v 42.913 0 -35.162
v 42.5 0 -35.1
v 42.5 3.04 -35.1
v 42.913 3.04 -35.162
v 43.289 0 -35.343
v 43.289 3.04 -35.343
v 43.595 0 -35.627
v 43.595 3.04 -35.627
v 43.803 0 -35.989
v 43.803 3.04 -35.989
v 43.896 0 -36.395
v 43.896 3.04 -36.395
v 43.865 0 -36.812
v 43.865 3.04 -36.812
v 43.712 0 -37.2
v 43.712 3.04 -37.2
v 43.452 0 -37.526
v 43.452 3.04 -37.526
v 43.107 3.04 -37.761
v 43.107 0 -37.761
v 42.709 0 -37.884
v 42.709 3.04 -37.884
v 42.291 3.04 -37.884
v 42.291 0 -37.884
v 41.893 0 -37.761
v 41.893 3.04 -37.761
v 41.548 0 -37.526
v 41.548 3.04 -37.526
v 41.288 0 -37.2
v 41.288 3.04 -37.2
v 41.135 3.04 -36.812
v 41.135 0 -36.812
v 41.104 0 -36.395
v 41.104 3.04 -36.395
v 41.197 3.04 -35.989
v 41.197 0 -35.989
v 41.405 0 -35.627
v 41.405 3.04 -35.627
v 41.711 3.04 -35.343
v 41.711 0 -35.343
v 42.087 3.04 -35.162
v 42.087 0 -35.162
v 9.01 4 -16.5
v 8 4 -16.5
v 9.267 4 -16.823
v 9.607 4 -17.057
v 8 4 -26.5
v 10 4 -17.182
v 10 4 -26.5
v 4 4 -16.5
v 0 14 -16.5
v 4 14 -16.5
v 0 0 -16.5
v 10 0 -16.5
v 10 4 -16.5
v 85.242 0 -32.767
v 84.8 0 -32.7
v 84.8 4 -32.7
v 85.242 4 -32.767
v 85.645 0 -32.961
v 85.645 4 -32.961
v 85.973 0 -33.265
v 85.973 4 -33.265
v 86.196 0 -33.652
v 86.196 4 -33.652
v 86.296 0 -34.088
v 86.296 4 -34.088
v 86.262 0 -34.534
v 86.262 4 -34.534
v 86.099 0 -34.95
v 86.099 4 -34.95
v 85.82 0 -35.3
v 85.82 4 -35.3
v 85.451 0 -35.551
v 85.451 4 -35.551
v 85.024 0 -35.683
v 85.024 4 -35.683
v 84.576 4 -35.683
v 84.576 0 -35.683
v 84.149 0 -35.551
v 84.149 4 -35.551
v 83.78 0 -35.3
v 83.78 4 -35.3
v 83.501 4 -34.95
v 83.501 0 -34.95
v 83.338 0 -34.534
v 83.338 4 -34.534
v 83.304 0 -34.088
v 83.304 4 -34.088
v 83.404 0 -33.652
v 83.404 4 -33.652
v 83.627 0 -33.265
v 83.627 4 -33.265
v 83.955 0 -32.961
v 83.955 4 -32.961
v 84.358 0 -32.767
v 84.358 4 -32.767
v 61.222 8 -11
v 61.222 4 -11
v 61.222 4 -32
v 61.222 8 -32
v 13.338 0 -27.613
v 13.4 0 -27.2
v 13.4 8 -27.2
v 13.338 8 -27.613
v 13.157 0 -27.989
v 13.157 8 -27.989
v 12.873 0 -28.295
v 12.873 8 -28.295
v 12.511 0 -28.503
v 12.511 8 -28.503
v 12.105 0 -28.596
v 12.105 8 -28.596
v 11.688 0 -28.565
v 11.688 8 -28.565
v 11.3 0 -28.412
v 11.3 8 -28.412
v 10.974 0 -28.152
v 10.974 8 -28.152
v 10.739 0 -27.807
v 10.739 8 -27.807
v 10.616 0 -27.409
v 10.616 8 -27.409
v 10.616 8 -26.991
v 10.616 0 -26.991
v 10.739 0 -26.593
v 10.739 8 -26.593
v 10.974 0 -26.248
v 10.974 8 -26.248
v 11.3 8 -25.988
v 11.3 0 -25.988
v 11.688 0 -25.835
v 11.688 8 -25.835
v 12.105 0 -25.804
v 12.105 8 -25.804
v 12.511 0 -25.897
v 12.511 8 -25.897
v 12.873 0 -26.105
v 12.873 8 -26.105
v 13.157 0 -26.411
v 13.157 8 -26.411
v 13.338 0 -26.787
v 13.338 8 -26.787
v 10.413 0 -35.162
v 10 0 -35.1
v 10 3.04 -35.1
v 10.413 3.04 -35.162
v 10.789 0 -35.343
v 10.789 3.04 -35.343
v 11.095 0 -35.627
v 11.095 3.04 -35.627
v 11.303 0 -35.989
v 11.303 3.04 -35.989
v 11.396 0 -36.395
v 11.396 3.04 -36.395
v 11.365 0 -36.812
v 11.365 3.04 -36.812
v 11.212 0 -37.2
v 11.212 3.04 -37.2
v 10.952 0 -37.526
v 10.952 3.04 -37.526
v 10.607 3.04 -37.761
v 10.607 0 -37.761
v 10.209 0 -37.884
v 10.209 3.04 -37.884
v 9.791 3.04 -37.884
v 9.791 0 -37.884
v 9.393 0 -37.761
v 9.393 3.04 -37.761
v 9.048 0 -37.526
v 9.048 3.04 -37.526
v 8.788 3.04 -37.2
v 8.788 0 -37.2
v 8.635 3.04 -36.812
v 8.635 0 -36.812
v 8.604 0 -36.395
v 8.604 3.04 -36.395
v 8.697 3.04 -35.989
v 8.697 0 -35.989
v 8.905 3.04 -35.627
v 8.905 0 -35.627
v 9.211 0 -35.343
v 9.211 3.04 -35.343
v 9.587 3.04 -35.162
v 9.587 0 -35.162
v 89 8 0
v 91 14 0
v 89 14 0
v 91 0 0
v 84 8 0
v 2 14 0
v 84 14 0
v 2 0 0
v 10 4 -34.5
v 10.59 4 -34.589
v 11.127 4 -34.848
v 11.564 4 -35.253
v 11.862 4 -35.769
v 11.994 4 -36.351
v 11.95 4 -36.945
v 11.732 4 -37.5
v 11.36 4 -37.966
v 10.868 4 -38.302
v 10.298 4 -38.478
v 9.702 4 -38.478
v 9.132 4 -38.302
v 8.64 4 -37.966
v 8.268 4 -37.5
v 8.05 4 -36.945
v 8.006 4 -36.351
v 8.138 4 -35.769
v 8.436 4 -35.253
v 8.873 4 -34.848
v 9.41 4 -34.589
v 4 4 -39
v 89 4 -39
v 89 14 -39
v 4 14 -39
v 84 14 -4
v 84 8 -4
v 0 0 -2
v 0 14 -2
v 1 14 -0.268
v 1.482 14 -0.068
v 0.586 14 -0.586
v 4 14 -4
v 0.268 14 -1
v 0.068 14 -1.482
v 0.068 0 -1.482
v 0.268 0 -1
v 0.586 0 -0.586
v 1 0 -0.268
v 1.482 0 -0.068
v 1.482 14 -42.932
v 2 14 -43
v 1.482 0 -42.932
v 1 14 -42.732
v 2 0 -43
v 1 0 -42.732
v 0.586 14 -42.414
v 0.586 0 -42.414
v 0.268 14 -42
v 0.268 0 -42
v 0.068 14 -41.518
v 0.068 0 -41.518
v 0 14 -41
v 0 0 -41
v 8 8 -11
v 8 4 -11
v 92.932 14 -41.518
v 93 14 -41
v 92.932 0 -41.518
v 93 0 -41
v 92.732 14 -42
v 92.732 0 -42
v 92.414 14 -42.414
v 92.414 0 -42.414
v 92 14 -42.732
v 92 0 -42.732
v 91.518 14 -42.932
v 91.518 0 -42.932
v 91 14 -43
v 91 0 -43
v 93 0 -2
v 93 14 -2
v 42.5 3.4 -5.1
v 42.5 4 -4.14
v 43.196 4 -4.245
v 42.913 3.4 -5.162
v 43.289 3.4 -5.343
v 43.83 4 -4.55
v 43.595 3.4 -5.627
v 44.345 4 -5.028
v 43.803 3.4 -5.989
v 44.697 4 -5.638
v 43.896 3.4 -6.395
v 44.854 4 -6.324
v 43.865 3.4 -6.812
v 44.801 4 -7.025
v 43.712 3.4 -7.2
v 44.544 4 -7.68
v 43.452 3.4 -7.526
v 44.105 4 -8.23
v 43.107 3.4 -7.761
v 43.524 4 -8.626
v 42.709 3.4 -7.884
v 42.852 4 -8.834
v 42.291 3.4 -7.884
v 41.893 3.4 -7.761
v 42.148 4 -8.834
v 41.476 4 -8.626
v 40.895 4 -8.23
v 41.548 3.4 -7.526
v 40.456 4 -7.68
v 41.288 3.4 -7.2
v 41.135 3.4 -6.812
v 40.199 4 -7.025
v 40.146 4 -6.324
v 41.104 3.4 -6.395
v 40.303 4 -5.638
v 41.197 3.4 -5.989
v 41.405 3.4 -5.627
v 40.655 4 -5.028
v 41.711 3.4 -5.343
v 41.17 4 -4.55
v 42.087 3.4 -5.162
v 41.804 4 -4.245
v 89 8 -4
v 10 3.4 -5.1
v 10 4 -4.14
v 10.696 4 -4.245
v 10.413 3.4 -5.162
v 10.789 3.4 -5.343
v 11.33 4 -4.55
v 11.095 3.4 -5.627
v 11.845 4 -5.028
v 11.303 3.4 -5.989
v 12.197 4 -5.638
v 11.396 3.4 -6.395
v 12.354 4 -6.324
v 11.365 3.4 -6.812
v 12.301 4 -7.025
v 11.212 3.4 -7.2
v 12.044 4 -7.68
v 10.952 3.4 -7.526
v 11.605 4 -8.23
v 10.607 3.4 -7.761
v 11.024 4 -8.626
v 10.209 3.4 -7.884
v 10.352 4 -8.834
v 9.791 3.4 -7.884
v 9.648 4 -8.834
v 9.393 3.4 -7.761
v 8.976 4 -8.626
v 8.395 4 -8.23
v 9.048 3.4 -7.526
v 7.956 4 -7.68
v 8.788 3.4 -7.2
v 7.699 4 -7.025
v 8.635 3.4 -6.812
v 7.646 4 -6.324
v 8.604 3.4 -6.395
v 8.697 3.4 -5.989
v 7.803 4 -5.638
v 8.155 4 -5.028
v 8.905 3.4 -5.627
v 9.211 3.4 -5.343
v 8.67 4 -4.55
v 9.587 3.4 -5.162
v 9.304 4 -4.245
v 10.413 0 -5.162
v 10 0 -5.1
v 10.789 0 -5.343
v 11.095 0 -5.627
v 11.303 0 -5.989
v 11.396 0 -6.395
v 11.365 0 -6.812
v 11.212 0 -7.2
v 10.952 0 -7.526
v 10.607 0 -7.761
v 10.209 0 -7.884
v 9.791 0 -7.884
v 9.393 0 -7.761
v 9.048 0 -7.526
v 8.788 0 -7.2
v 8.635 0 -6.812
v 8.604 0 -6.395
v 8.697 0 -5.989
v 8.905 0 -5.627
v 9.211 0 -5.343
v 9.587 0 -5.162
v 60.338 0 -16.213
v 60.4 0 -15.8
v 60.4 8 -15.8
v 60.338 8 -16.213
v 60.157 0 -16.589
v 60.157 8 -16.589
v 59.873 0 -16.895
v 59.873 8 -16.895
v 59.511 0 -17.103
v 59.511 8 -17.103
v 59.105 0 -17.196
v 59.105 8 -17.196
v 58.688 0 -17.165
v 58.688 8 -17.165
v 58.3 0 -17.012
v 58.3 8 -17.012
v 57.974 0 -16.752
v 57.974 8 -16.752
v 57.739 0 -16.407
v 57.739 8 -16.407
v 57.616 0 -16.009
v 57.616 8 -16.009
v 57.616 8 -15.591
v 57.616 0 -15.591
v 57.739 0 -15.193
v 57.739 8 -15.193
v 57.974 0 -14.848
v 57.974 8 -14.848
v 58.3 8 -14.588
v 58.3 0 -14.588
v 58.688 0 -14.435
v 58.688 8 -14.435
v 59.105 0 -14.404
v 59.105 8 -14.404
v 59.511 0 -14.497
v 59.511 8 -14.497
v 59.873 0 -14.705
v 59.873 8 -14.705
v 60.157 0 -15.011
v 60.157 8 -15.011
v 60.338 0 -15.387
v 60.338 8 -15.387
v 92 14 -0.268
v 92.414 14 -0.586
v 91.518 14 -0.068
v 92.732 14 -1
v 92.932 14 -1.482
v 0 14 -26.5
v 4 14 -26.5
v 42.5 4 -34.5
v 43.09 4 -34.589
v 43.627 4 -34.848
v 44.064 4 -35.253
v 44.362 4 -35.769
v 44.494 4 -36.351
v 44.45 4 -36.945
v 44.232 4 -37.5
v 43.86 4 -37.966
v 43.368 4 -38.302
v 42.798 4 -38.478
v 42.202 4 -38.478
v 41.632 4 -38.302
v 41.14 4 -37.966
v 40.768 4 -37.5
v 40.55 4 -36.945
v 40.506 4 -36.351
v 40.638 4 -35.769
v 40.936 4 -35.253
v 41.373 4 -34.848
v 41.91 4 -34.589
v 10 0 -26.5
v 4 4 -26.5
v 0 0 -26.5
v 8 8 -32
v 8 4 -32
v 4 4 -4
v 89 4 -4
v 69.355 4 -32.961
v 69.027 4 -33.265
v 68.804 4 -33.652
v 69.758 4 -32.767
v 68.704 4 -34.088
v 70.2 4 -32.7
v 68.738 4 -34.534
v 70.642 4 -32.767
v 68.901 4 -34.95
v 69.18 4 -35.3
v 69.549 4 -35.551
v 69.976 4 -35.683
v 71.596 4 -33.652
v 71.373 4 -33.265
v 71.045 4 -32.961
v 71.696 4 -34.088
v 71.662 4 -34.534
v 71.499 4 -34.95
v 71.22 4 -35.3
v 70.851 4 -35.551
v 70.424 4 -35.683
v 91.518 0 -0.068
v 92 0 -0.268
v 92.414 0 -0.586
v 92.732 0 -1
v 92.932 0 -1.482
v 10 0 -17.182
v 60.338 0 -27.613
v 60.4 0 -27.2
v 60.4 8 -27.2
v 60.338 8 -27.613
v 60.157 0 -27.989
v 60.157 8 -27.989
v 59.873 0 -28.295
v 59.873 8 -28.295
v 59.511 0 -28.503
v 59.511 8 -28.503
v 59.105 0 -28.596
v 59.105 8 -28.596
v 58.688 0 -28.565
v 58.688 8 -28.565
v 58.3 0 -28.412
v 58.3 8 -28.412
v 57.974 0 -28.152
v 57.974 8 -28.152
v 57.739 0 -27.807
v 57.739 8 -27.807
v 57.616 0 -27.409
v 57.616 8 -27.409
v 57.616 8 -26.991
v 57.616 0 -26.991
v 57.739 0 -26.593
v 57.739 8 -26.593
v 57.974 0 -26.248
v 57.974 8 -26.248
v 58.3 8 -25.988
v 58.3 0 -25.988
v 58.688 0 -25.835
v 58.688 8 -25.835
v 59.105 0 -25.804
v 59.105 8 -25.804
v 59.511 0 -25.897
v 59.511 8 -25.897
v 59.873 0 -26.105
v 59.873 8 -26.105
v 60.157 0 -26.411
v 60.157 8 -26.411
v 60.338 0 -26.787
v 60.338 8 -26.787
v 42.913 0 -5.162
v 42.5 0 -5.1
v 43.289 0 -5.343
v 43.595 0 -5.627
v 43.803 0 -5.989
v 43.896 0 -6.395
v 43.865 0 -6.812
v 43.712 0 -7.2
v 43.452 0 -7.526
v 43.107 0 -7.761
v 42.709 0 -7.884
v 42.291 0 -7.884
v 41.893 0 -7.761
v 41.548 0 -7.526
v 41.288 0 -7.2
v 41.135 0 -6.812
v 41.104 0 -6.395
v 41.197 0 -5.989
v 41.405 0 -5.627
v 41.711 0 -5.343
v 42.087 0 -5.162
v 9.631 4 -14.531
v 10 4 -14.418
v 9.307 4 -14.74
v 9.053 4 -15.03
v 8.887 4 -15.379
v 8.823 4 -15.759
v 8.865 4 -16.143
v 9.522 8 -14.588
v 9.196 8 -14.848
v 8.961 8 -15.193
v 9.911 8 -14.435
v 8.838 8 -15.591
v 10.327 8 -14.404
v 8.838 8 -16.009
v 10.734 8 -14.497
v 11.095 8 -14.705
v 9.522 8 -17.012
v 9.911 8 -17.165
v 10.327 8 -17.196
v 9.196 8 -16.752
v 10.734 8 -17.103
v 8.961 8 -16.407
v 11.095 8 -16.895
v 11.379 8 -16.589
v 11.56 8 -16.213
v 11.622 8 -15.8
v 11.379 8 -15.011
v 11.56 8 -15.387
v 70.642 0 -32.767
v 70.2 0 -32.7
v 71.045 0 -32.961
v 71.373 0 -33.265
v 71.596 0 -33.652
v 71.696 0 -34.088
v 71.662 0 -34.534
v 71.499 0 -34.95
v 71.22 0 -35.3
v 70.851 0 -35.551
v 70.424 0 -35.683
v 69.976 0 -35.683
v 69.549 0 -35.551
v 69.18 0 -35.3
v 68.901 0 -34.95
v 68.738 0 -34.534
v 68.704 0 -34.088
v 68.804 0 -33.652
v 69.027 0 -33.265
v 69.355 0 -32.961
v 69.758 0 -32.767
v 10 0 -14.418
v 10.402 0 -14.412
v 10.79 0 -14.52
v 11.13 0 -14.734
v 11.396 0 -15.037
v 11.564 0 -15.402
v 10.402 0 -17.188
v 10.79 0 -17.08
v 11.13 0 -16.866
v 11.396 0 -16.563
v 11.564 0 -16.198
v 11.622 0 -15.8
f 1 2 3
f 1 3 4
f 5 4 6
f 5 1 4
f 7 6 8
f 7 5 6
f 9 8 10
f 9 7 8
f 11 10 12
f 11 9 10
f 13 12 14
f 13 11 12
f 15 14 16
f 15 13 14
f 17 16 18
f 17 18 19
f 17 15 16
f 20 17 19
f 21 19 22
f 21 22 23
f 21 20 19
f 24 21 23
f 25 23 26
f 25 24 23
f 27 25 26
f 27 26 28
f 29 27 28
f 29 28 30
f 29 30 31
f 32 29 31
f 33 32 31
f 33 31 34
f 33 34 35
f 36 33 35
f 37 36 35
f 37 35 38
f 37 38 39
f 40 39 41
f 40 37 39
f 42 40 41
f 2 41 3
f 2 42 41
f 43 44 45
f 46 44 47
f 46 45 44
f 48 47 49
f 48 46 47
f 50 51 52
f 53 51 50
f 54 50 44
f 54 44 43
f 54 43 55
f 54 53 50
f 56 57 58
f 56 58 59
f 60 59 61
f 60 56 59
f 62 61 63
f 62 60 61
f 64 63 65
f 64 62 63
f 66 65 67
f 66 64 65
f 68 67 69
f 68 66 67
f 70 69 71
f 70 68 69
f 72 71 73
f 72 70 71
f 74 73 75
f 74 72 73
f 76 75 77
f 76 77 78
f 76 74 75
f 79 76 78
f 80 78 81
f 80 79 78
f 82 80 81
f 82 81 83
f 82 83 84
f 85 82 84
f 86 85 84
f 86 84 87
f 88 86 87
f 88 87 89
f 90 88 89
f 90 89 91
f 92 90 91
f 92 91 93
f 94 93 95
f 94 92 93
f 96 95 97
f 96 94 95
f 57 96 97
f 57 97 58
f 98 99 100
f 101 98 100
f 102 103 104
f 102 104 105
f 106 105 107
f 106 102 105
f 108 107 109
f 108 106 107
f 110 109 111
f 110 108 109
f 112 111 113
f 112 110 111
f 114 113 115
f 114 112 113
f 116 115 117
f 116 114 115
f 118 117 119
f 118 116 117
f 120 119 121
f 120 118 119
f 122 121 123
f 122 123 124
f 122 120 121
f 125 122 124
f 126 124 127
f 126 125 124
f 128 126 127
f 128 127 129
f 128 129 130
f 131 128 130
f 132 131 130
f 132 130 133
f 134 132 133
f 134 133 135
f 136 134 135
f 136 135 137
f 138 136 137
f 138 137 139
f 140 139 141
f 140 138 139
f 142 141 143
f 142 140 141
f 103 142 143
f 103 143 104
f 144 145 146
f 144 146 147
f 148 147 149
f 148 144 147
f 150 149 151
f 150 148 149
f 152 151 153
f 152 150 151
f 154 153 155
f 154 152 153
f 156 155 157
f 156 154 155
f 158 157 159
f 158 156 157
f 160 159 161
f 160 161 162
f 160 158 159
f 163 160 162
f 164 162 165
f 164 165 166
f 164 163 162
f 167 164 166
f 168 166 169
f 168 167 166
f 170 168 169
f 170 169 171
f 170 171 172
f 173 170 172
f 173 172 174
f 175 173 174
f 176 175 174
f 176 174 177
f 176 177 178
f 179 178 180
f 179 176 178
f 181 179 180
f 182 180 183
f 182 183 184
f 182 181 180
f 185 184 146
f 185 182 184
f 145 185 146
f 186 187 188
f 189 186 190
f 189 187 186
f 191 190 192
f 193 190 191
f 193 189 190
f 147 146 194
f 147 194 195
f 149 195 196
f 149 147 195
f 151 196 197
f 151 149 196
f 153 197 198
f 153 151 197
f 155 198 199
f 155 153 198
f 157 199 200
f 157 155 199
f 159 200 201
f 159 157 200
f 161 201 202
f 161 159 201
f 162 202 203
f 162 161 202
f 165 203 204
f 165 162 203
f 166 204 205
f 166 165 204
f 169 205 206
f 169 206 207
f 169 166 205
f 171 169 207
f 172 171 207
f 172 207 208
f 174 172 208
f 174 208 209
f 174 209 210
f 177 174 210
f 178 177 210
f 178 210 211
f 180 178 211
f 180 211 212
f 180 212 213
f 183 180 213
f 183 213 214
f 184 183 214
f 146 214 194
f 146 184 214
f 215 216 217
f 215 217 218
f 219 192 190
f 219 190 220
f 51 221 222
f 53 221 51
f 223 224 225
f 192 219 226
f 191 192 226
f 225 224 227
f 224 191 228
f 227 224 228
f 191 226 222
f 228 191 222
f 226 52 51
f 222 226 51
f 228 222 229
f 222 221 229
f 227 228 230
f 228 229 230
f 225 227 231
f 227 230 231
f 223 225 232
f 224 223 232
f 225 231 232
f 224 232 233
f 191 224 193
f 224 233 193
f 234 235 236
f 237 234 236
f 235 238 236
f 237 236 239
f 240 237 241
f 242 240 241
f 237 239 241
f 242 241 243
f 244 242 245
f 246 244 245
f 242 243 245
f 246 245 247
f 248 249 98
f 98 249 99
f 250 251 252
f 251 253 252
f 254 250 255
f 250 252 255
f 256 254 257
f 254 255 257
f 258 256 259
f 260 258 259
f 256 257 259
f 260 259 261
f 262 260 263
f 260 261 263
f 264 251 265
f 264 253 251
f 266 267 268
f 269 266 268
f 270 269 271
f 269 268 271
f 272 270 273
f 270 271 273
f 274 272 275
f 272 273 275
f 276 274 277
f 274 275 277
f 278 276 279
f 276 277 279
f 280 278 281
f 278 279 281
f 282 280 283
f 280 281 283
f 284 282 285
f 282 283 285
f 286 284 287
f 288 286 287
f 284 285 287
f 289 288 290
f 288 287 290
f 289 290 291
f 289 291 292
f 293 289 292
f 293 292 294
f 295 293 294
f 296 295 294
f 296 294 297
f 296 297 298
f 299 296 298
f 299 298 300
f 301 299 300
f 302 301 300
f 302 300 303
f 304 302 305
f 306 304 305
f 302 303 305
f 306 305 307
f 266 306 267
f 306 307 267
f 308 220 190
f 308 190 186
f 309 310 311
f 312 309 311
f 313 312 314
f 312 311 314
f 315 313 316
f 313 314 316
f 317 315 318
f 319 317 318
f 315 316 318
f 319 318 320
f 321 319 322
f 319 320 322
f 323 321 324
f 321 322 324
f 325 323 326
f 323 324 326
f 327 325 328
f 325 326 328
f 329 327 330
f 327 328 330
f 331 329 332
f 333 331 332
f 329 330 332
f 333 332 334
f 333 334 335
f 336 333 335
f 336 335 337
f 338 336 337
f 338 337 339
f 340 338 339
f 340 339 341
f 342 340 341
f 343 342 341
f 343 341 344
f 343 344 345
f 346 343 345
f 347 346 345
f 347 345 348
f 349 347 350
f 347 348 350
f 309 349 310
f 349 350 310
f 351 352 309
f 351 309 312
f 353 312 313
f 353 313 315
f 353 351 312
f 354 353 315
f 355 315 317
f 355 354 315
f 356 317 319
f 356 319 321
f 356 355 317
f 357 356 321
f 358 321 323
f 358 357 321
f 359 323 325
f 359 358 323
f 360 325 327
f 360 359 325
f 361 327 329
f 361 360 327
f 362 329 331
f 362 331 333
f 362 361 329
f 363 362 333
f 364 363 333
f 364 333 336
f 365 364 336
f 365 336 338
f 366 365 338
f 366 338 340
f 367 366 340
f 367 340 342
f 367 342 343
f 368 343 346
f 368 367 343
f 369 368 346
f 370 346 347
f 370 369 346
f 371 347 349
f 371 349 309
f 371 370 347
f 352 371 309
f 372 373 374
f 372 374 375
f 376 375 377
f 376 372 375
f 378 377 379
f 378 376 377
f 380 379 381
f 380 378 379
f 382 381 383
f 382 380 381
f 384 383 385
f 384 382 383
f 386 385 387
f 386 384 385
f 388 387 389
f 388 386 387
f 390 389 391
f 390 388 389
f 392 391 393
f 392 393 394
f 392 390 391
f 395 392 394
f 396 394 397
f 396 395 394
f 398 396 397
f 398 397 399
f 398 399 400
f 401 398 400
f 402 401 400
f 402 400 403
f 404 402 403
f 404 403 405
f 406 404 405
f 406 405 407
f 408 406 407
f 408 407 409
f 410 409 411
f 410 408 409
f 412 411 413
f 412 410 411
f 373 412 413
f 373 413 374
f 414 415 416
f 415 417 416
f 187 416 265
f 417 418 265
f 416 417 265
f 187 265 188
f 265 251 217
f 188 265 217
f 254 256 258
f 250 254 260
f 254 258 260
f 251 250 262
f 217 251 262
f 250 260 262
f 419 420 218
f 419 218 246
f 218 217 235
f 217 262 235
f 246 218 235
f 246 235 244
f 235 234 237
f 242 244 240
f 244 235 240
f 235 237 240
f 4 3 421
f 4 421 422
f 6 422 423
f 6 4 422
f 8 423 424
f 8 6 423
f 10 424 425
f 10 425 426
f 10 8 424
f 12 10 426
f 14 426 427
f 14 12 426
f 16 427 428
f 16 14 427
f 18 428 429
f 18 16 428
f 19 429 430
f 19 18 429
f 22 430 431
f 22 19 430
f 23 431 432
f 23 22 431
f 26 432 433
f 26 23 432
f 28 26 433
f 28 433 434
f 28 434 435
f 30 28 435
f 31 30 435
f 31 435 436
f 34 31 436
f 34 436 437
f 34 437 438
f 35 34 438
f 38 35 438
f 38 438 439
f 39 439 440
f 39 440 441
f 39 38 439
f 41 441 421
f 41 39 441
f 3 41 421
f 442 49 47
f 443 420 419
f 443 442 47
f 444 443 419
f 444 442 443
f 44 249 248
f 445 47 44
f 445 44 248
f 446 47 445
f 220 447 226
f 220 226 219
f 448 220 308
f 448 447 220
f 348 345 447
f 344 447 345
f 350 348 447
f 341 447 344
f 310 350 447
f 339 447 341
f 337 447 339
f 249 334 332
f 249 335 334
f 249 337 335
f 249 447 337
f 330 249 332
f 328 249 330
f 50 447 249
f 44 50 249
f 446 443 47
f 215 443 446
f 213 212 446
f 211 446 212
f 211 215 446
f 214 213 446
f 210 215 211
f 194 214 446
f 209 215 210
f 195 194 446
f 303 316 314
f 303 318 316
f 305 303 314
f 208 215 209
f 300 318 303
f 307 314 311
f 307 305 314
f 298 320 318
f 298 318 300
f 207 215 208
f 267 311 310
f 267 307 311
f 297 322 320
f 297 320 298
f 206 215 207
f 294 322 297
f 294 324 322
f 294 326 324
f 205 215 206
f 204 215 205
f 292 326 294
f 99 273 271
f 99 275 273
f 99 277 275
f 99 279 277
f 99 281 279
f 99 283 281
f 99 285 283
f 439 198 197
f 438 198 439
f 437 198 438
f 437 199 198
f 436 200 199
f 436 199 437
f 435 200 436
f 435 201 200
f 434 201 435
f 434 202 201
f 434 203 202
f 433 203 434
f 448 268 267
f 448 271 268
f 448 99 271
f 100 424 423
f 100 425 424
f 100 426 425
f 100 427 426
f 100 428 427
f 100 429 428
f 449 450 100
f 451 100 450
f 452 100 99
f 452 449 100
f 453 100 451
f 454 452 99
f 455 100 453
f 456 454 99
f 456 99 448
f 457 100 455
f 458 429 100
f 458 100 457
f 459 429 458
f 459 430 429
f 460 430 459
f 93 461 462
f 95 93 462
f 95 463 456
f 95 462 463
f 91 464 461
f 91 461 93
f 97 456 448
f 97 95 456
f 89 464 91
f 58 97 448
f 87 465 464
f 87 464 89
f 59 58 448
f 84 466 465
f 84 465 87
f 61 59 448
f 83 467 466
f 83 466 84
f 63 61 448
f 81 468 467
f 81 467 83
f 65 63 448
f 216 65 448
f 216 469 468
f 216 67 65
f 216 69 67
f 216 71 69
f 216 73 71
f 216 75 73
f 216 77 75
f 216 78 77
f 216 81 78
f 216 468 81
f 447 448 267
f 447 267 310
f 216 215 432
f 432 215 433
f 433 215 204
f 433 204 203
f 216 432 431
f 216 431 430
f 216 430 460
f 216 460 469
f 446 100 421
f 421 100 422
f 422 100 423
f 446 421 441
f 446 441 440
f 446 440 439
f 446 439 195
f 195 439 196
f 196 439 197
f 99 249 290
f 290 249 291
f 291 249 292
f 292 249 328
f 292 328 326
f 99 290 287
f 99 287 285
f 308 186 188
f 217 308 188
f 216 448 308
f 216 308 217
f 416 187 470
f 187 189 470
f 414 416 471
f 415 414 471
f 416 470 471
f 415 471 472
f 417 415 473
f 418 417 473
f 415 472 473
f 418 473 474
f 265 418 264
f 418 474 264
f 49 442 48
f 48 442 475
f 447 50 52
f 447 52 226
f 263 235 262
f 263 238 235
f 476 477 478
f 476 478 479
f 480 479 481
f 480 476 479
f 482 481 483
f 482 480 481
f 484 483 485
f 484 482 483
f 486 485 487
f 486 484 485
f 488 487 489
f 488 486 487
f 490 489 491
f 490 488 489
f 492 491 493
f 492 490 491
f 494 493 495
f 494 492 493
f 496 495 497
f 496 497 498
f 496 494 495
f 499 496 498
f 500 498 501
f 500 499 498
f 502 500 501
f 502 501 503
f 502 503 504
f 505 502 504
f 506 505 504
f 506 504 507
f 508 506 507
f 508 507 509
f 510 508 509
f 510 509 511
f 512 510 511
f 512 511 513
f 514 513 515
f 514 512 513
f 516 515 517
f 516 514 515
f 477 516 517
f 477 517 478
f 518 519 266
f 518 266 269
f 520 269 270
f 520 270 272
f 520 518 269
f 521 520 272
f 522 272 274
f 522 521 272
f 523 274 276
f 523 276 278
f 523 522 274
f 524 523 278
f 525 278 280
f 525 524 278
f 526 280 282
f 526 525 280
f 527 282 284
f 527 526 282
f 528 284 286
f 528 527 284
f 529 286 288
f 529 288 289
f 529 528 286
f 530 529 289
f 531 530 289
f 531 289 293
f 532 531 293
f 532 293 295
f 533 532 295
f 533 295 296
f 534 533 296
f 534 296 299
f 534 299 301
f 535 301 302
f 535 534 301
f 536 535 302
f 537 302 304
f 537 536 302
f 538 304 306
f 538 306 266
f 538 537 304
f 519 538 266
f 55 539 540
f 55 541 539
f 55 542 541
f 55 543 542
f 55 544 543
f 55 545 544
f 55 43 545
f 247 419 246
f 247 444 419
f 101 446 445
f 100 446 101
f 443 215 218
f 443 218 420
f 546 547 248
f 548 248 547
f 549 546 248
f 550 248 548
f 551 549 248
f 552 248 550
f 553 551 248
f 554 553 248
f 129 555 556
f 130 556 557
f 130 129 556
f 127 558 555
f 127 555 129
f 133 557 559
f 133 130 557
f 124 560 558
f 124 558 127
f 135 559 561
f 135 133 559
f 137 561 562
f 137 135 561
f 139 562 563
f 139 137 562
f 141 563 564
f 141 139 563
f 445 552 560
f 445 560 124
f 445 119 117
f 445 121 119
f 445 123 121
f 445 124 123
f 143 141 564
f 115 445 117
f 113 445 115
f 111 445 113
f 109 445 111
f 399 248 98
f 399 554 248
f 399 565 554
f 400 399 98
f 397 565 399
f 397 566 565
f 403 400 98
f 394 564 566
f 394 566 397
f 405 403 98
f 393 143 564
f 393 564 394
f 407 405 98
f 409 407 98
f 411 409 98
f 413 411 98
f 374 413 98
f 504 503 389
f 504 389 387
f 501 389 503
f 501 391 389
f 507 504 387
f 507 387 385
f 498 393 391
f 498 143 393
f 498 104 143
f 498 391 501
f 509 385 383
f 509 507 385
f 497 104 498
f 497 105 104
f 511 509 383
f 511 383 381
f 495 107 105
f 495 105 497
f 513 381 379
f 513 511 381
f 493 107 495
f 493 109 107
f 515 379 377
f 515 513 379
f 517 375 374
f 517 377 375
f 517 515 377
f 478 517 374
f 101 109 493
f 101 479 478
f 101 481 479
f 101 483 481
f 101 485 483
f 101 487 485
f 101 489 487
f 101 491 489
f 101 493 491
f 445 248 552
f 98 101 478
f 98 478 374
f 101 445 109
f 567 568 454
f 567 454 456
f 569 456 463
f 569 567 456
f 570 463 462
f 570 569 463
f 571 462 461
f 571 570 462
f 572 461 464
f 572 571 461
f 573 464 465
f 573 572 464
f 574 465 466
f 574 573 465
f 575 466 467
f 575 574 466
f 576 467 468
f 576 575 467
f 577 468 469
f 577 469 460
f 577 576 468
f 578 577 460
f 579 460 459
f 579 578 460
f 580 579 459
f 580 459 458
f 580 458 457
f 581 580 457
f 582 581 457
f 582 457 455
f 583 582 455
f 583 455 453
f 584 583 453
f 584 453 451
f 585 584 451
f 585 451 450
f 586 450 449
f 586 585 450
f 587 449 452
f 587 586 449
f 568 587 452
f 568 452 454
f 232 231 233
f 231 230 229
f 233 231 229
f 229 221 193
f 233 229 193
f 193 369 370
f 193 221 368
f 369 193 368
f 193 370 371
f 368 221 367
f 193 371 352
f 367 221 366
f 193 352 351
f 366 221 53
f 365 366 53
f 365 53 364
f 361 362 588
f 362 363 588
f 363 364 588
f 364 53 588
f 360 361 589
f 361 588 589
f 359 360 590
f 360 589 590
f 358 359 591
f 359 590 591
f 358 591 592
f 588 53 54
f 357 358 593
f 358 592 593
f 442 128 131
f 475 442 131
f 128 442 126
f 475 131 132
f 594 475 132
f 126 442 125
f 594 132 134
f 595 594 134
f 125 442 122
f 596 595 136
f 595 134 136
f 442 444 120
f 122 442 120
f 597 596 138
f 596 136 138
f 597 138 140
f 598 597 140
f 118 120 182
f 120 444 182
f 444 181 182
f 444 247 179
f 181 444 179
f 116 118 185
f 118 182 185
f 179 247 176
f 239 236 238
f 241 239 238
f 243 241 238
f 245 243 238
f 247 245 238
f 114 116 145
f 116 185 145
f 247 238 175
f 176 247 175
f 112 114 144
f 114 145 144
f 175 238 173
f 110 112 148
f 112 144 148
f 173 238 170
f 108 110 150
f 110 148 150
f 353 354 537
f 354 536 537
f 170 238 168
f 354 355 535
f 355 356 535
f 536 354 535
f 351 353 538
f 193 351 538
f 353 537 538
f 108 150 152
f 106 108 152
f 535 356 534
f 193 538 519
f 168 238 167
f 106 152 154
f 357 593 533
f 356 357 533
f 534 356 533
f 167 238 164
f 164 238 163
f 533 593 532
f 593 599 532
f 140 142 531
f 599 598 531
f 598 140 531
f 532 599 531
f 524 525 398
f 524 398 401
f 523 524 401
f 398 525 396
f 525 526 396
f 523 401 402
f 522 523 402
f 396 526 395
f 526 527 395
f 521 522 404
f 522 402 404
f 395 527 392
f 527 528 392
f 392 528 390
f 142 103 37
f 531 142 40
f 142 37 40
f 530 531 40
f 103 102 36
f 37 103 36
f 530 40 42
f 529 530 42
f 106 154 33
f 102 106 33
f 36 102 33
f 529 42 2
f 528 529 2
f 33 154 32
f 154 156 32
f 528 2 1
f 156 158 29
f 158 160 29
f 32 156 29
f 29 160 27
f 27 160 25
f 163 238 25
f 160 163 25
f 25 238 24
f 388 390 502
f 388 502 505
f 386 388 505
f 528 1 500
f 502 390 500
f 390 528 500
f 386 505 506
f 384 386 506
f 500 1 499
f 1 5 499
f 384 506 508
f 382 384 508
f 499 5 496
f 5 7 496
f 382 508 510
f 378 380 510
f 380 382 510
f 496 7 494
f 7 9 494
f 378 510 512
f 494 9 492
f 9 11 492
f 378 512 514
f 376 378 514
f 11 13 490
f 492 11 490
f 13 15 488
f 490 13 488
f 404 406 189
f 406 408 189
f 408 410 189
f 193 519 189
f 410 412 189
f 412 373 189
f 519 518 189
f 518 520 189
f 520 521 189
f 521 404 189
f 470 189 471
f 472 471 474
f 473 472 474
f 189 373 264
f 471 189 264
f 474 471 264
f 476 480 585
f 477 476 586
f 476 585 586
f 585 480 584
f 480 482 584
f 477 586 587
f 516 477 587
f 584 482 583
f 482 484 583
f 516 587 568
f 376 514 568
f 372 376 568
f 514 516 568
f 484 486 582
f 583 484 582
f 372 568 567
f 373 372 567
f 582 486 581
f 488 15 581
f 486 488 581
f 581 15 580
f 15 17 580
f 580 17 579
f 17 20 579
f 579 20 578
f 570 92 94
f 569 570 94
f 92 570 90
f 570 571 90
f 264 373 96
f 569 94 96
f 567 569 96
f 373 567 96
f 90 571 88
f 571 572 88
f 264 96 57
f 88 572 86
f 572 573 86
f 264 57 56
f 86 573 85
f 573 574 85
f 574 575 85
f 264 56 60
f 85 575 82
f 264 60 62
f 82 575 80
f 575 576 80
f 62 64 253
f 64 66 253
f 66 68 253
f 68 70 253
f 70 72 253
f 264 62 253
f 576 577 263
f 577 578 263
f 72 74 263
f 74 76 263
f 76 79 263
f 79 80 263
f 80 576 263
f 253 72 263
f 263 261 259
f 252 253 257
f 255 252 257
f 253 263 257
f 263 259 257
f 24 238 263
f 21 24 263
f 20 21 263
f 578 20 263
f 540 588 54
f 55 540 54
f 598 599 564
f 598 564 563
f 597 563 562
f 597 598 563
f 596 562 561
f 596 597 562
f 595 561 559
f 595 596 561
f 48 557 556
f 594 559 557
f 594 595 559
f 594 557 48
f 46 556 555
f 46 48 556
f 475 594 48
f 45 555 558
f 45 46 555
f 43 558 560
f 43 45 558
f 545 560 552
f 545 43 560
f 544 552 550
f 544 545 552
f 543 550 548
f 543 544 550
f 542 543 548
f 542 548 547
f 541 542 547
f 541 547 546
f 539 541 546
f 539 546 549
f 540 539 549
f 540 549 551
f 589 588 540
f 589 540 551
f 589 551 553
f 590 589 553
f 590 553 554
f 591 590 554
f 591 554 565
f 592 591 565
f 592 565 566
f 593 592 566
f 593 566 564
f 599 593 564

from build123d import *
from OCP.BRepFilletAPI import BRepFilletAPI_MakeChamfer

# Parameters (mm, degrees)
SKETCH1_W               = 93
SKETCH1_H               = 43
SKETCH1_R               = 1.4
SKETCH1_W_2             = 51
SKETCH1_H_2             = 21
SKETCH1_W_3             = 21
SKETCH1_H_3             = 34
BOSS_EXTRUDE1_DEPTH     = 4
BOSS_EXTRUDE2_OUTLINE_W = 53.222222222
BOSS_EXTRUDE2_OUTLINE_H = 21
BOSS_EXTRUDE2_OUTLINE_R = 1.4
BOSS_EXTRUDE2_DEPTH     = 8
SKETCH1_4_W             = 21
SKETCH1_4_H             = 34
SKETCH1_4_R             = 1.5
BOSS_EXTRUDE3_DEPTH     = 4
CHAMFER1_SIZE           = 0.6
CHAMFER1_SIZE2          = 0.960200717
SKETCH2_W               = 10
SKETCH2_H               = 10
CUT_EXTRUDE1_DEPTH      = 4
BOSS_EXTRUDE4_DEPTH     = 10
FILLET1_R               = 2
SKETCH5_W               = 5
SKETCH5_H               = 4
CUT_EXTRUDE3_DEPTH      = 6


# Read off the part's stored shape, not the designer's step: Boss-Extrude2
with BuildPart() as part:
    # Sketch1 → Boss-Extrude1 (new body)
    with BuildSketch(Plane(origin=(0, 0, 0), x_dir=(1, 0, 0), z_dir=(0, 1, 0))):
        with Locations((46.5, 21.5)):
            Rectangle(SKETCH1_W, SKETCH1_H)
        with Locations(Location((10, 36.5, 0), (0, 0, 270))):
            Circle(SKETCH1_R, mode=Mode.SUBTRACT)
        with Locations(Location((42.5, 36.5, 0), (0, 0, 270))):
            Circle(SKETCH1_R, mode=Mode.SUBTRACT)
        with Locations(Location((42.5, 6.5, 0), (0, 0, 270))):
            Circle(SKETCH1_R, mode=Mode.SUBTRACT)
        with Locations(Location((10, 6.5, 0), (0, 0, 270))):
            Circle(SKETCH1_R, mode=Mode.SUBTRACT)
        with Locations((35.5, 21.5)):
            Rectangle(SKETCH1_W_2, SKETCH1_H_2, mode=Mode.SUBTRACT)
        with Locations((77.5, 21.5)):
            Rectangle(SKETCH1_W_3, SKETCH1_H_3, mode=Mode.SUBTRACT)
    extrude(amount=BOSS_EXTRUDE1_DEPTH)

    # Boss-Extrude2 outline → Boss-Extrude2 (add)
    with BuildSketch(Plane(origin=(0, 0, 0), x_dir=(1, 0, 0), z_dir=(0, 1, 0))):
        with Locations((34.611111111, 21.5)):
            Rectangle(BOSS_EXTRUDE2_OUTLINE_W, BOSS_EXTRUDE2_OUTLINE_H)
        with Locations((10.222222222, 15.8)):
            Circle(BOSS_EXTRUDE2_OUTLINE_R, mode=Mode.SUBTRACT)
        with Locations((12, 27.2)):
            Circle(BOSS_EXTRUDE2_OUTLINE_R, mode=Mode.SUBTRACT)
        with Locations((59, 27.2)):
            Circle(BOSS_EXTRUDE2_OUTLINE_R, mode=Mode.SUBTRACT)
        with Locations((59, 15.8)):
            Circle(BOSS_EXTRUDE2_OUTLINE_R, mode=Mode.SUBTRACT)
    extrude(amount=BOSS_EXTRUDE2_DEPTH)

    # Sketch1<4> → Boss-Extrude3 (add)
    with BuildSketch(Plane(origin=(0, 0, 0), x_dir=(1, 0, 0), z_dir=(0, 1, 0))):
        with Locations((77.5, 21.5)):
            Rectangle(SKETCH1_4_W, SKETCH1_4_H)
        with Locations(Location((70.2, 34.2, 0), (0, 0, 270))):
            Circle(SKETCH1_4_R, mode=Mode.SUBTRACT)
        with Locations(Location((84.8, 34.2, 0), (0, 0, 270))):
            Circle(SKETCH1_4_R, mode=Mode.SUBTRACT)
    extrude(amount=BOSS_EXTRUDE3_DEPTH)

    # Chamfer1: one chamfer whose edges measure the first distance from different faces: ONE call of the kernel's chamfer builder (chamfer() names one face for all edges)
    chamfer1_edges_1 = [part.edges().sort_by_distance(p)[0] for p in [
        (42.5, 4, -7.9),
    ]]
    chamfer1_side_1 = [part.faces().sort_by_distance(p)[0] for p in [
        (42.5, 2, -7.9),
    ]]
    chamfer1_edges_2 = [part.edges().sort_by_distance(p)[0] for p in [
        (42.5, 4, -37.9),
        (10, 4, -37.9),
    ]]
    chamfer1_side_2 = [part.faces().sort_by_distance(p)[0] for p in [
        (46.5, 4, -1.024597482),
    ]]
    chamfer1_edges_3 = [part.edges().sort_by_distance(p)[0] for p in [
        (10, 4, -7.9),
    ]]
    chamfer1_side_3 = [part.faces().sort_by_distance(p)[0] for p in [
        (10, 2, -7.9),
    ]]
    chamfer1 = BRepFilletAPI_MakeChamfer(part.part.solid().wrapped)
    for e in chamfer1_edges_1:
        chamfer1.Add(CHAMFER1_SIZE, CHAMFER1_SIZE2, e.wrapped, chamfer1_side_1[0].wrapped)  # the first distance lies on this face
    for e in chamfer1_edges_2:
        chamfer1.Add(CHAMFER1_SIZE, CHAMFER1_SIZE2, e.wrapped, chamfer1_side_2[0].wrapped)  # the first distance lies on this face
    for e in chamfer1_edges_3:
        chamfer1.Add(CHAMFER1_SIZE, CHAMFER1_SIZE2, e.wrapped, chamfer1_side_3[0].wrapped)  # the first distance lies on this face
    add(Compound.cast(chamfer1.Shape()), mode=Mode.REPLACE)

    # Sketch2 → Cut-Extrude1 (cut)
    with BuildSketch(Plane.XZ):
        with Locations((5, -21.5)):
            Rectangle(SKETCH2_W, SKETCH2_H)
    extrude(amount=-CUT_EXTRUDE1_DEPTH, mode=Mode.SUBTRACT)

    # Sketch3 → Boss-Extrude4 (add)
    with BuildSketch(Plane(origin=(0, 4, 0), x_dir=(1, 0, 0), z_dir=(0, 1, 0))):
        Polygon((4, 39), (4, 26.5), (0, 26.5), (0, 43), (93, 43), (93, 0), (0, 0), (0, 16.5), (4, 16.5), (4, 4), (89, 4), (89, 39), align=None)
    extrude(amount=BOSS_EXTRUDE4_DEPTH)

    # Fillet1
    fillet1_edges = [part.edges().sort_by_distance(p)[0] for p in [
        (0, 7, 0),
        (0, 7, -43),
        (93, 7, -43),
        (93, 7, 0),
    ]]
    fillet(fillet1_edges, radius=FILLET1_R)

    # Sketch5 → Cut-Extrude3 (cut)
    with BuildSketch(Plane(origin=(0, 14, 0), x_dir=(1, 0, 0), z_dir=(0, 1, 0))):
        with Locations((86.5, 2)):
            Rectangle(SKETCH5_W, SKETCH5_H)
    extrude(amount=-CUT_EXTRUDE3_DEPTH, mode=Mode.SUBTRACT)


solid = part.part
